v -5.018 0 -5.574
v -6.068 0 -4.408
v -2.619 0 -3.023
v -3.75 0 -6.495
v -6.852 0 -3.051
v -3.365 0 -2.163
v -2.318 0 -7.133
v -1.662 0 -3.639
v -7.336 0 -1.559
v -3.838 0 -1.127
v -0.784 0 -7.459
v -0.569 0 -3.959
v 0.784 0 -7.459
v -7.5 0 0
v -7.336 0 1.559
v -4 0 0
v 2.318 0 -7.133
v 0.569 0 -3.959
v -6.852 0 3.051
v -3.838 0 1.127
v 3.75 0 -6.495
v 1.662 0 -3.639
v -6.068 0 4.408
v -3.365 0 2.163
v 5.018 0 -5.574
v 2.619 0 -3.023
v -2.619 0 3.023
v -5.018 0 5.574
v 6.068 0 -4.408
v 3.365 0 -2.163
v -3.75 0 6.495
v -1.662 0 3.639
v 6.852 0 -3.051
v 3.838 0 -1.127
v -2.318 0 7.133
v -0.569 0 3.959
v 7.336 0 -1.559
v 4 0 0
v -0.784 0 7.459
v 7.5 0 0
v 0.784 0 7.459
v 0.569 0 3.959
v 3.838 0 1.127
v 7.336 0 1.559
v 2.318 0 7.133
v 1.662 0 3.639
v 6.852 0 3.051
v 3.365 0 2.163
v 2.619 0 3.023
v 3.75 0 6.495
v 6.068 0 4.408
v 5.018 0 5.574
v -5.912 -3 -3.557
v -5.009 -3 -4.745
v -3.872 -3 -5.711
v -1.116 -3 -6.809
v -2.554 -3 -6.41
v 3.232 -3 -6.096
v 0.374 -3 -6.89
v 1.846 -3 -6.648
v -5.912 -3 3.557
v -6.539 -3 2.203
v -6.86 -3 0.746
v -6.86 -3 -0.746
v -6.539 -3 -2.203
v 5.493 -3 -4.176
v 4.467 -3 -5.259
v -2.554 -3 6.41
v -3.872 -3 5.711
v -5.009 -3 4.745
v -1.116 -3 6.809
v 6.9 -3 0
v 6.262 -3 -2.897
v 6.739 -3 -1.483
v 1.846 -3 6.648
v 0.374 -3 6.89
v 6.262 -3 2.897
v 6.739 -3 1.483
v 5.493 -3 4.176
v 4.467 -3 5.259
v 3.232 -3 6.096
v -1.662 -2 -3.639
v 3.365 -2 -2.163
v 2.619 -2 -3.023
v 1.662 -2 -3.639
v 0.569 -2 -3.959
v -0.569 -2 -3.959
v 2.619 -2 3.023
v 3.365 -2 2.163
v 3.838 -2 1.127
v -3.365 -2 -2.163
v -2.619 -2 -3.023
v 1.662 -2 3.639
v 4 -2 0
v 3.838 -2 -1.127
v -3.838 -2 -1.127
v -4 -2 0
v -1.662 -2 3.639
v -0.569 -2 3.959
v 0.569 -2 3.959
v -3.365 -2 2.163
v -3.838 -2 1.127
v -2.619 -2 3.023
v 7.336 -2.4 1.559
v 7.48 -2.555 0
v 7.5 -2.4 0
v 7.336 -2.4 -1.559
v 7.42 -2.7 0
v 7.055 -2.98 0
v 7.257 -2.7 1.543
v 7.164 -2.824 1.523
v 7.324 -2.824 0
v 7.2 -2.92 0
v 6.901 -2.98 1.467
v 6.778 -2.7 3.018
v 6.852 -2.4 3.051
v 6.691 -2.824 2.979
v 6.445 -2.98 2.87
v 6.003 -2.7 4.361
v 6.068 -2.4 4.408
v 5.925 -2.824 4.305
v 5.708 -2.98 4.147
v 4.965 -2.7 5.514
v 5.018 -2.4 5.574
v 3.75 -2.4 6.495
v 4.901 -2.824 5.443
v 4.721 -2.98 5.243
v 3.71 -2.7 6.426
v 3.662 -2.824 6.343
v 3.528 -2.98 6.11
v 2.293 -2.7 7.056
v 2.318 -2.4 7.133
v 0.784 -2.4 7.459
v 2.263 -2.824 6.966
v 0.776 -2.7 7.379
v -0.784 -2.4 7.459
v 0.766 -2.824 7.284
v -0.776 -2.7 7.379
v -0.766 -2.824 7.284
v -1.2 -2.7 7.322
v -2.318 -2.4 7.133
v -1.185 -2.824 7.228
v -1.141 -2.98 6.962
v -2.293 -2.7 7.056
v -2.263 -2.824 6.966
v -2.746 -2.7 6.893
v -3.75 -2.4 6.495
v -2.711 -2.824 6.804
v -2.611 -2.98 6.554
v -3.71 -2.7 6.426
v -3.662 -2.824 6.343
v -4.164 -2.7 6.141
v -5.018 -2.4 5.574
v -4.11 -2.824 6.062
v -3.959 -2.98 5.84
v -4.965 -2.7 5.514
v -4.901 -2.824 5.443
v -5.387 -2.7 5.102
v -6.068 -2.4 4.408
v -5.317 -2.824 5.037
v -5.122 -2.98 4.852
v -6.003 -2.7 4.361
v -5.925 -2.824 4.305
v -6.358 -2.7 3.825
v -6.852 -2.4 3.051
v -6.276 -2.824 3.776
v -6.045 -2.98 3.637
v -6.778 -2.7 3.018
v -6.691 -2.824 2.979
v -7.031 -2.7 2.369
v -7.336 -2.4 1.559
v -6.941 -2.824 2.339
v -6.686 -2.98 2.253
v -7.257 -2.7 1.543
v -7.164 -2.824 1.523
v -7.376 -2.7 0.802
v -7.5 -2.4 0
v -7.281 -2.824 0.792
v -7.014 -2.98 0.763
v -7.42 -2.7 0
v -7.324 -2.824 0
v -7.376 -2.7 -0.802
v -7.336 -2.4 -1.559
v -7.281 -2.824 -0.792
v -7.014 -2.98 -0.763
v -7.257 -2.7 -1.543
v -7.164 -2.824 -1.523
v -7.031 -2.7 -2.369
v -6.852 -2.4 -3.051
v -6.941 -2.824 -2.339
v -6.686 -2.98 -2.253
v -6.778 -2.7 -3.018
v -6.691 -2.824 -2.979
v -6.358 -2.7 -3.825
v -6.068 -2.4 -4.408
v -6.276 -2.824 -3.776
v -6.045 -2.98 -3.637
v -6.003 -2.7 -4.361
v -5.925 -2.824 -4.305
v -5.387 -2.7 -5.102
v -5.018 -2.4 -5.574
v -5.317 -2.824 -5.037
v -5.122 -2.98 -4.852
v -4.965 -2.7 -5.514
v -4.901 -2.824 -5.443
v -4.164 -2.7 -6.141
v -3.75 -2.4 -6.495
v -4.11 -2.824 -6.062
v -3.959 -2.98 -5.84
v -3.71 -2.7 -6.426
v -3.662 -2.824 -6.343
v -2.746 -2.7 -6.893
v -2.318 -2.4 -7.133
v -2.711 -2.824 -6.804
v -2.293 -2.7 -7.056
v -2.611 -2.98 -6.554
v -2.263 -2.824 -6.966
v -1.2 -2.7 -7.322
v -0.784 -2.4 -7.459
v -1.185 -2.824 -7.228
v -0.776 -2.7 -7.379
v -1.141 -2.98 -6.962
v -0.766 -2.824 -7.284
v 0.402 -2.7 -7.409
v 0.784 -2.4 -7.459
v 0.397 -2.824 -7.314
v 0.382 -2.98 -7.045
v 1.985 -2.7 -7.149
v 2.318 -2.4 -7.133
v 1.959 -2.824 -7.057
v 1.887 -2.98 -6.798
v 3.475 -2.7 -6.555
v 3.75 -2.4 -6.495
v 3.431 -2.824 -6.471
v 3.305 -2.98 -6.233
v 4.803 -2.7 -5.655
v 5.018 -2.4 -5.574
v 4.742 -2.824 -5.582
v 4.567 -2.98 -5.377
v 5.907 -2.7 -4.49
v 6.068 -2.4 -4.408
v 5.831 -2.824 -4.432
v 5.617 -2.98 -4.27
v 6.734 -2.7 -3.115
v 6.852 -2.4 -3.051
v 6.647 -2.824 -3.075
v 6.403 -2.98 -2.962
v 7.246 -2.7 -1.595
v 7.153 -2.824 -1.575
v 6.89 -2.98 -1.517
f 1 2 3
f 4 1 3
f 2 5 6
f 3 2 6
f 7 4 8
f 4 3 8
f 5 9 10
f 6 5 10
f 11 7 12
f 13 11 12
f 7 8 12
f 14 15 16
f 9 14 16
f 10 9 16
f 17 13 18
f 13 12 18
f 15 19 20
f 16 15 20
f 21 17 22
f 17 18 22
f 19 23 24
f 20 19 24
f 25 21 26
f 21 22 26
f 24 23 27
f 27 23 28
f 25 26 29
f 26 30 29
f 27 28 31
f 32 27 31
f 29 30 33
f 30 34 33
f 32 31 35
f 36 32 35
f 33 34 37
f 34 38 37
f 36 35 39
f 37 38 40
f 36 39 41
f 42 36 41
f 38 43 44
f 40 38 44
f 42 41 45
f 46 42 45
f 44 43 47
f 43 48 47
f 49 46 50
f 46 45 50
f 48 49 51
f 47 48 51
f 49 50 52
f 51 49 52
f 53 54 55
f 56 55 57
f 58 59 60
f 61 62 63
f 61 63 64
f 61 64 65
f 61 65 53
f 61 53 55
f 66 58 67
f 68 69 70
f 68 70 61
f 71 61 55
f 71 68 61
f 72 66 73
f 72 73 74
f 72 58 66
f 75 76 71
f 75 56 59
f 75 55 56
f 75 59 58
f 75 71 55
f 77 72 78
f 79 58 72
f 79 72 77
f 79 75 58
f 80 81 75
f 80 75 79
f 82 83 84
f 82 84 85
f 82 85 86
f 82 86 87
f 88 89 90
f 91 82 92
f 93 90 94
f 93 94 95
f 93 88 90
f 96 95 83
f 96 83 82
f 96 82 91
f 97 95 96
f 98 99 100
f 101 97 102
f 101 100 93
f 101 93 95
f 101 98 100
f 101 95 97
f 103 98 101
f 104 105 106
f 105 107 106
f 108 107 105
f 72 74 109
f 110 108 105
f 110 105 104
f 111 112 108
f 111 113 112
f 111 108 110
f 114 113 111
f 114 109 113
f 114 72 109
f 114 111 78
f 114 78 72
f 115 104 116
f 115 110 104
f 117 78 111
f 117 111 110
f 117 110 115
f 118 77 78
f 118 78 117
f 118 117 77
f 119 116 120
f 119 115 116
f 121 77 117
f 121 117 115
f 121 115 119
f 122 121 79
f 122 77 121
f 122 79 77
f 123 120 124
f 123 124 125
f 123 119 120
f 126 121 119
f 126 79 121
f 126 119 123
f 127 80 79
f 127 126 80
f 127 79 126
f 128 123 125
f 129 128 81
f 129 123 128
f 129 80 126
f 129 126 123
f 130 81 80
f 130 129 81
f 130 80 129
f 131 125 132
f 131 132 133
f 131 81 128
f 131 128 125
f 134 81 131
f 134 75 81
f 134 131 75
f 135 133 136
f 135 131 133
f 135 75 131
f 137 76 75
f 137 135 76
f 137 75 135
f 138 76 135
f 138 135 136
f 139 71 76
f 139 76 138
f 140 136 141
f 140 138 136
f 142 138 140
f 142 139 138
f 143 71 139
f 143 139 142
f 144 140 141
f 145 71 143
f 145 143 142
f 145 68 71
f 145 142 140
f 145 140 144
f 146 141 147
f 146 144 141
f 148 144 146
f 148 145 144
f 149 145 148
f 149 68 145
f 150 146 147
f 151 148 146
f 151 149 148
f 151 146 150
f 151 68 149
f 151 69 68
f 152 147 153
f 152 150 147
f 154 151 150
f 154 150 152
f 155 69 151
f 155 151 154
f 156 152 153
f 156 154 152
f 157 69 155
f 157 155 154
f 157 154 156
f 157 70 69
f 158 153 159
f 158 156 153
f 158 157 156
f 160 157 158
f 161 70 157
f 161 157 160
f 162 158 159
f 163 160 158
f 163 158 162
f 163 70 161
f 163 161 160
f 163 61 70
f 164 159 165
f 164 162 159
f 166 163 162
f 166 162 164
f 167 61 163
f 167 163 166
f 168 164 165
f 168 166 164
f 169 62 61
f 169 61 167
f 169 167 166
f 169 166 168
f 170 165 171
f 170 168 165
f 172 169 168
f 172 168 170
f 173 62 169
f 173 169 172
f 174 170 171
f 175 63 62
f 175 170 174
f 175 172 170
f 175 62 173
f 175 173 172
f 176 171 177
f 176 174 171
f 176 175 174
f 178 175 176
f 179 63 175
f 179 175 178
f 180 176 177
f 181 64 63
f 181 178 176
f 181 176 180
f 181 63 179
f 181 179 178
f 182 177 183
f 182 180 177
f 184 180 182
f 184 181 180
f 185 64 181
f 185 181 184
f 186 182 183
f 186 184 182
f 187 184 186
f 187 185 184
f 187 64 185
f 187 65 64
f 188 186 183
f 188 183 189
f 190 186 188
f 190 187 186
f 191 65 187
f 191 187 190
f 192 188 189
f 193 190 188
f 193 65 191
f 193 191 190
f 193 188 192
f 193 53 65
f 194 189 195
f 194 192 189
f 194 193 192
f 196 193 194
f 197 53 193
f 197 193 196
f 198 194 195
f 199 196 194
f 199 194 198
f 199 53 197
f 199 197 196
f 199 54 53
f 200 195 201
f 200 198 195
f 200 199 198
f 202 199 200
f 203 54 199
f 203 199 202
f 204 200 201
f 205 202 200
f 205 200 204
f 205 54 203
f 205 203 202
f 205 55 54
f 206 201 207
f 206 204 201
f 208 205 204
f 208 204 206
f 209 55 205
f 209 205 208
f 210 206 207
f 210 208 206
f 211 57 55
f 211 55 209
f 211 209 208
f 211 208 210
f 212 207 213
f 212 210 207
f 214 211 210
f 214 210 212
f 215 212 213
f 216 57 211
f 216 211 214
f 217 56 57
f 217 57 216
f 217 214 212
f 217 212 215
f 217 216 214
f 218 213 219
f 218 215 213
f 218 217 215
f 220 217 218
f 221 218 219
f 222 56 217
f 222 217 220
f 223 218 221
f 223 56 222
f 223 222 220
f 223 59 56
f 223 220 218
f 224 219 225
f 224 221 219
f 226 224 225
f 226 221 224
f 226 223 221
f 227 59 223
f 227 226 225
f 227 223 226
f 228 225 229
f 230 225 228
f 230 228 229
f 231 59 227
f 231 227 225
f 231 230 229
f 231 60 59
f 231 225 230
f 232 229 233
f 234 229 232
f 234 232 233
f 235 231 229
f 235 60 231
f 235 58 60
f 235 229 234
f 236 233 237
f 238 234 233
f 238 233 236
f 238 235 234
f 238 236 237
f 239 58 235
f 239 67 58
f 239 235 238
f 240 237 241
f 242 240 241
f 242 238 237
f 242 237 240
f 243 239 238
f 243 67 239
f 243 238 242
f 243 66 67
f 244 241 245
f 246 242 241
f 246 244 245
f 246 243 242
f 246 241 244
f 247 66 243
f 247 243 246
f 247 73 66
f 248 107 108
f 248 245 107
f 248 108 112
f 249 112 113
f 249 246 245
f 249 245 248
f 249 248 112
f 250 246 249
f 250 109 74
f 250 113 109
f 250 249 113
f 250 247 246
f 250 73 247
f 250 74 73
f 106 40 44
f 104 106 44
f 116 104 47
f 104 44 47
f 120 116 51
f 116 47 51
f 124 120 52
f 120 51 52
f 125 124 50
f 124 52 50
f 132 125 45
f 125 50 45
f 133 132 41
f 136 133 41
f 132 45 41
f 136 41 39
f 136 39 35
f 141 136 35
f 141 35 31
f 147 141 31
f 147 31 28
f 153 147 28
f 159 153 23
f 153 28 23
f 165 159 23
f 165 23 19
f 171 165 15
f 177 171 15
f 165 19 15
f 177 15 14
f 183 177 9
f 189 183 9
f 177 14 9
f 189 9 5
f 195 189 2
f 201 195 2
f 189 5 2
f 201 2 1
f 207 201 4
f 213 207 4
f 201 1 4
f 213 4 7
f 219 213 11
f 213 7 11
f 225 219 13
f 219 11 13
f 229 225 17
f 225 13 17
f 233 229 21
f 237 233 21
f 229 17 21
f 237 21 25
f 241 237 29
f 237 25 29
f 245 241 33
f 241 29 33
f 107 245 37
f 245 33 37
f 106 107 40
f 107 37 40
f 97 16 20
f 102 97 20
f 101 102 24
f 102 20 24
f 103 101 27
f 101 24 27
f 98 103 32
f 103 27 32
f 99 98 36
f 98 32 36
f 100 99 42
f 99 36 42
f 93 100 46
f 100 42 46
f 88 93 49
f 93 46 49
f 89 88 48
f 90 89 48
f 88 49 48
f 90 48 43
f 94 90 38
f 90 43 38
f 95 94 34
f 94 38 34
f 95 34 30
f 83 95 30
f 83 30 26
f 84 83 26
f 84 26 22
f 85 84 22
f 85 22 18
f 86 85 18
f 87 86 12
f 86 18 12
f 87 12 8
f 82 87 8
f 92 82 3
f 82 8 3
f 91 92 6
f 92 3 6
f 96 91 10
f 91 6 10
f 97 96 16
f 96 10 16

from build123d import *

# Parameters (mm, degrees)
F0_R     = 7.5
F1_DEPTH = 3
F2_R     = 0.6
F3_R     = 4
F4_DEPTH = 2


with BuildPart() as f1:
    # F0 (on Front) → F1 (new body)
    with BuildSketch(Plane.XZ):
        Circle(F0_R)
    extrude(amount=F1_DEPTH)

    # F2
    f2_edges = [f1.edges().sort_by_distance(p)[0] for p in [
        (-7.5, -3, 0),
    ]]
    fillet(f2_edges, radius=F2_R)

    # F3 (on face) → F4 (cut)
    with BuildSketch(Plane(origin=(0, 0, 0), x_dir=(-1, 0, 0), z_dir=(0, 1, 0))):
        Circle(F3_R)
    extrude(amount=-F4_DEPTH, mode=Mode.SUBTRACT)


solid = f1.part
